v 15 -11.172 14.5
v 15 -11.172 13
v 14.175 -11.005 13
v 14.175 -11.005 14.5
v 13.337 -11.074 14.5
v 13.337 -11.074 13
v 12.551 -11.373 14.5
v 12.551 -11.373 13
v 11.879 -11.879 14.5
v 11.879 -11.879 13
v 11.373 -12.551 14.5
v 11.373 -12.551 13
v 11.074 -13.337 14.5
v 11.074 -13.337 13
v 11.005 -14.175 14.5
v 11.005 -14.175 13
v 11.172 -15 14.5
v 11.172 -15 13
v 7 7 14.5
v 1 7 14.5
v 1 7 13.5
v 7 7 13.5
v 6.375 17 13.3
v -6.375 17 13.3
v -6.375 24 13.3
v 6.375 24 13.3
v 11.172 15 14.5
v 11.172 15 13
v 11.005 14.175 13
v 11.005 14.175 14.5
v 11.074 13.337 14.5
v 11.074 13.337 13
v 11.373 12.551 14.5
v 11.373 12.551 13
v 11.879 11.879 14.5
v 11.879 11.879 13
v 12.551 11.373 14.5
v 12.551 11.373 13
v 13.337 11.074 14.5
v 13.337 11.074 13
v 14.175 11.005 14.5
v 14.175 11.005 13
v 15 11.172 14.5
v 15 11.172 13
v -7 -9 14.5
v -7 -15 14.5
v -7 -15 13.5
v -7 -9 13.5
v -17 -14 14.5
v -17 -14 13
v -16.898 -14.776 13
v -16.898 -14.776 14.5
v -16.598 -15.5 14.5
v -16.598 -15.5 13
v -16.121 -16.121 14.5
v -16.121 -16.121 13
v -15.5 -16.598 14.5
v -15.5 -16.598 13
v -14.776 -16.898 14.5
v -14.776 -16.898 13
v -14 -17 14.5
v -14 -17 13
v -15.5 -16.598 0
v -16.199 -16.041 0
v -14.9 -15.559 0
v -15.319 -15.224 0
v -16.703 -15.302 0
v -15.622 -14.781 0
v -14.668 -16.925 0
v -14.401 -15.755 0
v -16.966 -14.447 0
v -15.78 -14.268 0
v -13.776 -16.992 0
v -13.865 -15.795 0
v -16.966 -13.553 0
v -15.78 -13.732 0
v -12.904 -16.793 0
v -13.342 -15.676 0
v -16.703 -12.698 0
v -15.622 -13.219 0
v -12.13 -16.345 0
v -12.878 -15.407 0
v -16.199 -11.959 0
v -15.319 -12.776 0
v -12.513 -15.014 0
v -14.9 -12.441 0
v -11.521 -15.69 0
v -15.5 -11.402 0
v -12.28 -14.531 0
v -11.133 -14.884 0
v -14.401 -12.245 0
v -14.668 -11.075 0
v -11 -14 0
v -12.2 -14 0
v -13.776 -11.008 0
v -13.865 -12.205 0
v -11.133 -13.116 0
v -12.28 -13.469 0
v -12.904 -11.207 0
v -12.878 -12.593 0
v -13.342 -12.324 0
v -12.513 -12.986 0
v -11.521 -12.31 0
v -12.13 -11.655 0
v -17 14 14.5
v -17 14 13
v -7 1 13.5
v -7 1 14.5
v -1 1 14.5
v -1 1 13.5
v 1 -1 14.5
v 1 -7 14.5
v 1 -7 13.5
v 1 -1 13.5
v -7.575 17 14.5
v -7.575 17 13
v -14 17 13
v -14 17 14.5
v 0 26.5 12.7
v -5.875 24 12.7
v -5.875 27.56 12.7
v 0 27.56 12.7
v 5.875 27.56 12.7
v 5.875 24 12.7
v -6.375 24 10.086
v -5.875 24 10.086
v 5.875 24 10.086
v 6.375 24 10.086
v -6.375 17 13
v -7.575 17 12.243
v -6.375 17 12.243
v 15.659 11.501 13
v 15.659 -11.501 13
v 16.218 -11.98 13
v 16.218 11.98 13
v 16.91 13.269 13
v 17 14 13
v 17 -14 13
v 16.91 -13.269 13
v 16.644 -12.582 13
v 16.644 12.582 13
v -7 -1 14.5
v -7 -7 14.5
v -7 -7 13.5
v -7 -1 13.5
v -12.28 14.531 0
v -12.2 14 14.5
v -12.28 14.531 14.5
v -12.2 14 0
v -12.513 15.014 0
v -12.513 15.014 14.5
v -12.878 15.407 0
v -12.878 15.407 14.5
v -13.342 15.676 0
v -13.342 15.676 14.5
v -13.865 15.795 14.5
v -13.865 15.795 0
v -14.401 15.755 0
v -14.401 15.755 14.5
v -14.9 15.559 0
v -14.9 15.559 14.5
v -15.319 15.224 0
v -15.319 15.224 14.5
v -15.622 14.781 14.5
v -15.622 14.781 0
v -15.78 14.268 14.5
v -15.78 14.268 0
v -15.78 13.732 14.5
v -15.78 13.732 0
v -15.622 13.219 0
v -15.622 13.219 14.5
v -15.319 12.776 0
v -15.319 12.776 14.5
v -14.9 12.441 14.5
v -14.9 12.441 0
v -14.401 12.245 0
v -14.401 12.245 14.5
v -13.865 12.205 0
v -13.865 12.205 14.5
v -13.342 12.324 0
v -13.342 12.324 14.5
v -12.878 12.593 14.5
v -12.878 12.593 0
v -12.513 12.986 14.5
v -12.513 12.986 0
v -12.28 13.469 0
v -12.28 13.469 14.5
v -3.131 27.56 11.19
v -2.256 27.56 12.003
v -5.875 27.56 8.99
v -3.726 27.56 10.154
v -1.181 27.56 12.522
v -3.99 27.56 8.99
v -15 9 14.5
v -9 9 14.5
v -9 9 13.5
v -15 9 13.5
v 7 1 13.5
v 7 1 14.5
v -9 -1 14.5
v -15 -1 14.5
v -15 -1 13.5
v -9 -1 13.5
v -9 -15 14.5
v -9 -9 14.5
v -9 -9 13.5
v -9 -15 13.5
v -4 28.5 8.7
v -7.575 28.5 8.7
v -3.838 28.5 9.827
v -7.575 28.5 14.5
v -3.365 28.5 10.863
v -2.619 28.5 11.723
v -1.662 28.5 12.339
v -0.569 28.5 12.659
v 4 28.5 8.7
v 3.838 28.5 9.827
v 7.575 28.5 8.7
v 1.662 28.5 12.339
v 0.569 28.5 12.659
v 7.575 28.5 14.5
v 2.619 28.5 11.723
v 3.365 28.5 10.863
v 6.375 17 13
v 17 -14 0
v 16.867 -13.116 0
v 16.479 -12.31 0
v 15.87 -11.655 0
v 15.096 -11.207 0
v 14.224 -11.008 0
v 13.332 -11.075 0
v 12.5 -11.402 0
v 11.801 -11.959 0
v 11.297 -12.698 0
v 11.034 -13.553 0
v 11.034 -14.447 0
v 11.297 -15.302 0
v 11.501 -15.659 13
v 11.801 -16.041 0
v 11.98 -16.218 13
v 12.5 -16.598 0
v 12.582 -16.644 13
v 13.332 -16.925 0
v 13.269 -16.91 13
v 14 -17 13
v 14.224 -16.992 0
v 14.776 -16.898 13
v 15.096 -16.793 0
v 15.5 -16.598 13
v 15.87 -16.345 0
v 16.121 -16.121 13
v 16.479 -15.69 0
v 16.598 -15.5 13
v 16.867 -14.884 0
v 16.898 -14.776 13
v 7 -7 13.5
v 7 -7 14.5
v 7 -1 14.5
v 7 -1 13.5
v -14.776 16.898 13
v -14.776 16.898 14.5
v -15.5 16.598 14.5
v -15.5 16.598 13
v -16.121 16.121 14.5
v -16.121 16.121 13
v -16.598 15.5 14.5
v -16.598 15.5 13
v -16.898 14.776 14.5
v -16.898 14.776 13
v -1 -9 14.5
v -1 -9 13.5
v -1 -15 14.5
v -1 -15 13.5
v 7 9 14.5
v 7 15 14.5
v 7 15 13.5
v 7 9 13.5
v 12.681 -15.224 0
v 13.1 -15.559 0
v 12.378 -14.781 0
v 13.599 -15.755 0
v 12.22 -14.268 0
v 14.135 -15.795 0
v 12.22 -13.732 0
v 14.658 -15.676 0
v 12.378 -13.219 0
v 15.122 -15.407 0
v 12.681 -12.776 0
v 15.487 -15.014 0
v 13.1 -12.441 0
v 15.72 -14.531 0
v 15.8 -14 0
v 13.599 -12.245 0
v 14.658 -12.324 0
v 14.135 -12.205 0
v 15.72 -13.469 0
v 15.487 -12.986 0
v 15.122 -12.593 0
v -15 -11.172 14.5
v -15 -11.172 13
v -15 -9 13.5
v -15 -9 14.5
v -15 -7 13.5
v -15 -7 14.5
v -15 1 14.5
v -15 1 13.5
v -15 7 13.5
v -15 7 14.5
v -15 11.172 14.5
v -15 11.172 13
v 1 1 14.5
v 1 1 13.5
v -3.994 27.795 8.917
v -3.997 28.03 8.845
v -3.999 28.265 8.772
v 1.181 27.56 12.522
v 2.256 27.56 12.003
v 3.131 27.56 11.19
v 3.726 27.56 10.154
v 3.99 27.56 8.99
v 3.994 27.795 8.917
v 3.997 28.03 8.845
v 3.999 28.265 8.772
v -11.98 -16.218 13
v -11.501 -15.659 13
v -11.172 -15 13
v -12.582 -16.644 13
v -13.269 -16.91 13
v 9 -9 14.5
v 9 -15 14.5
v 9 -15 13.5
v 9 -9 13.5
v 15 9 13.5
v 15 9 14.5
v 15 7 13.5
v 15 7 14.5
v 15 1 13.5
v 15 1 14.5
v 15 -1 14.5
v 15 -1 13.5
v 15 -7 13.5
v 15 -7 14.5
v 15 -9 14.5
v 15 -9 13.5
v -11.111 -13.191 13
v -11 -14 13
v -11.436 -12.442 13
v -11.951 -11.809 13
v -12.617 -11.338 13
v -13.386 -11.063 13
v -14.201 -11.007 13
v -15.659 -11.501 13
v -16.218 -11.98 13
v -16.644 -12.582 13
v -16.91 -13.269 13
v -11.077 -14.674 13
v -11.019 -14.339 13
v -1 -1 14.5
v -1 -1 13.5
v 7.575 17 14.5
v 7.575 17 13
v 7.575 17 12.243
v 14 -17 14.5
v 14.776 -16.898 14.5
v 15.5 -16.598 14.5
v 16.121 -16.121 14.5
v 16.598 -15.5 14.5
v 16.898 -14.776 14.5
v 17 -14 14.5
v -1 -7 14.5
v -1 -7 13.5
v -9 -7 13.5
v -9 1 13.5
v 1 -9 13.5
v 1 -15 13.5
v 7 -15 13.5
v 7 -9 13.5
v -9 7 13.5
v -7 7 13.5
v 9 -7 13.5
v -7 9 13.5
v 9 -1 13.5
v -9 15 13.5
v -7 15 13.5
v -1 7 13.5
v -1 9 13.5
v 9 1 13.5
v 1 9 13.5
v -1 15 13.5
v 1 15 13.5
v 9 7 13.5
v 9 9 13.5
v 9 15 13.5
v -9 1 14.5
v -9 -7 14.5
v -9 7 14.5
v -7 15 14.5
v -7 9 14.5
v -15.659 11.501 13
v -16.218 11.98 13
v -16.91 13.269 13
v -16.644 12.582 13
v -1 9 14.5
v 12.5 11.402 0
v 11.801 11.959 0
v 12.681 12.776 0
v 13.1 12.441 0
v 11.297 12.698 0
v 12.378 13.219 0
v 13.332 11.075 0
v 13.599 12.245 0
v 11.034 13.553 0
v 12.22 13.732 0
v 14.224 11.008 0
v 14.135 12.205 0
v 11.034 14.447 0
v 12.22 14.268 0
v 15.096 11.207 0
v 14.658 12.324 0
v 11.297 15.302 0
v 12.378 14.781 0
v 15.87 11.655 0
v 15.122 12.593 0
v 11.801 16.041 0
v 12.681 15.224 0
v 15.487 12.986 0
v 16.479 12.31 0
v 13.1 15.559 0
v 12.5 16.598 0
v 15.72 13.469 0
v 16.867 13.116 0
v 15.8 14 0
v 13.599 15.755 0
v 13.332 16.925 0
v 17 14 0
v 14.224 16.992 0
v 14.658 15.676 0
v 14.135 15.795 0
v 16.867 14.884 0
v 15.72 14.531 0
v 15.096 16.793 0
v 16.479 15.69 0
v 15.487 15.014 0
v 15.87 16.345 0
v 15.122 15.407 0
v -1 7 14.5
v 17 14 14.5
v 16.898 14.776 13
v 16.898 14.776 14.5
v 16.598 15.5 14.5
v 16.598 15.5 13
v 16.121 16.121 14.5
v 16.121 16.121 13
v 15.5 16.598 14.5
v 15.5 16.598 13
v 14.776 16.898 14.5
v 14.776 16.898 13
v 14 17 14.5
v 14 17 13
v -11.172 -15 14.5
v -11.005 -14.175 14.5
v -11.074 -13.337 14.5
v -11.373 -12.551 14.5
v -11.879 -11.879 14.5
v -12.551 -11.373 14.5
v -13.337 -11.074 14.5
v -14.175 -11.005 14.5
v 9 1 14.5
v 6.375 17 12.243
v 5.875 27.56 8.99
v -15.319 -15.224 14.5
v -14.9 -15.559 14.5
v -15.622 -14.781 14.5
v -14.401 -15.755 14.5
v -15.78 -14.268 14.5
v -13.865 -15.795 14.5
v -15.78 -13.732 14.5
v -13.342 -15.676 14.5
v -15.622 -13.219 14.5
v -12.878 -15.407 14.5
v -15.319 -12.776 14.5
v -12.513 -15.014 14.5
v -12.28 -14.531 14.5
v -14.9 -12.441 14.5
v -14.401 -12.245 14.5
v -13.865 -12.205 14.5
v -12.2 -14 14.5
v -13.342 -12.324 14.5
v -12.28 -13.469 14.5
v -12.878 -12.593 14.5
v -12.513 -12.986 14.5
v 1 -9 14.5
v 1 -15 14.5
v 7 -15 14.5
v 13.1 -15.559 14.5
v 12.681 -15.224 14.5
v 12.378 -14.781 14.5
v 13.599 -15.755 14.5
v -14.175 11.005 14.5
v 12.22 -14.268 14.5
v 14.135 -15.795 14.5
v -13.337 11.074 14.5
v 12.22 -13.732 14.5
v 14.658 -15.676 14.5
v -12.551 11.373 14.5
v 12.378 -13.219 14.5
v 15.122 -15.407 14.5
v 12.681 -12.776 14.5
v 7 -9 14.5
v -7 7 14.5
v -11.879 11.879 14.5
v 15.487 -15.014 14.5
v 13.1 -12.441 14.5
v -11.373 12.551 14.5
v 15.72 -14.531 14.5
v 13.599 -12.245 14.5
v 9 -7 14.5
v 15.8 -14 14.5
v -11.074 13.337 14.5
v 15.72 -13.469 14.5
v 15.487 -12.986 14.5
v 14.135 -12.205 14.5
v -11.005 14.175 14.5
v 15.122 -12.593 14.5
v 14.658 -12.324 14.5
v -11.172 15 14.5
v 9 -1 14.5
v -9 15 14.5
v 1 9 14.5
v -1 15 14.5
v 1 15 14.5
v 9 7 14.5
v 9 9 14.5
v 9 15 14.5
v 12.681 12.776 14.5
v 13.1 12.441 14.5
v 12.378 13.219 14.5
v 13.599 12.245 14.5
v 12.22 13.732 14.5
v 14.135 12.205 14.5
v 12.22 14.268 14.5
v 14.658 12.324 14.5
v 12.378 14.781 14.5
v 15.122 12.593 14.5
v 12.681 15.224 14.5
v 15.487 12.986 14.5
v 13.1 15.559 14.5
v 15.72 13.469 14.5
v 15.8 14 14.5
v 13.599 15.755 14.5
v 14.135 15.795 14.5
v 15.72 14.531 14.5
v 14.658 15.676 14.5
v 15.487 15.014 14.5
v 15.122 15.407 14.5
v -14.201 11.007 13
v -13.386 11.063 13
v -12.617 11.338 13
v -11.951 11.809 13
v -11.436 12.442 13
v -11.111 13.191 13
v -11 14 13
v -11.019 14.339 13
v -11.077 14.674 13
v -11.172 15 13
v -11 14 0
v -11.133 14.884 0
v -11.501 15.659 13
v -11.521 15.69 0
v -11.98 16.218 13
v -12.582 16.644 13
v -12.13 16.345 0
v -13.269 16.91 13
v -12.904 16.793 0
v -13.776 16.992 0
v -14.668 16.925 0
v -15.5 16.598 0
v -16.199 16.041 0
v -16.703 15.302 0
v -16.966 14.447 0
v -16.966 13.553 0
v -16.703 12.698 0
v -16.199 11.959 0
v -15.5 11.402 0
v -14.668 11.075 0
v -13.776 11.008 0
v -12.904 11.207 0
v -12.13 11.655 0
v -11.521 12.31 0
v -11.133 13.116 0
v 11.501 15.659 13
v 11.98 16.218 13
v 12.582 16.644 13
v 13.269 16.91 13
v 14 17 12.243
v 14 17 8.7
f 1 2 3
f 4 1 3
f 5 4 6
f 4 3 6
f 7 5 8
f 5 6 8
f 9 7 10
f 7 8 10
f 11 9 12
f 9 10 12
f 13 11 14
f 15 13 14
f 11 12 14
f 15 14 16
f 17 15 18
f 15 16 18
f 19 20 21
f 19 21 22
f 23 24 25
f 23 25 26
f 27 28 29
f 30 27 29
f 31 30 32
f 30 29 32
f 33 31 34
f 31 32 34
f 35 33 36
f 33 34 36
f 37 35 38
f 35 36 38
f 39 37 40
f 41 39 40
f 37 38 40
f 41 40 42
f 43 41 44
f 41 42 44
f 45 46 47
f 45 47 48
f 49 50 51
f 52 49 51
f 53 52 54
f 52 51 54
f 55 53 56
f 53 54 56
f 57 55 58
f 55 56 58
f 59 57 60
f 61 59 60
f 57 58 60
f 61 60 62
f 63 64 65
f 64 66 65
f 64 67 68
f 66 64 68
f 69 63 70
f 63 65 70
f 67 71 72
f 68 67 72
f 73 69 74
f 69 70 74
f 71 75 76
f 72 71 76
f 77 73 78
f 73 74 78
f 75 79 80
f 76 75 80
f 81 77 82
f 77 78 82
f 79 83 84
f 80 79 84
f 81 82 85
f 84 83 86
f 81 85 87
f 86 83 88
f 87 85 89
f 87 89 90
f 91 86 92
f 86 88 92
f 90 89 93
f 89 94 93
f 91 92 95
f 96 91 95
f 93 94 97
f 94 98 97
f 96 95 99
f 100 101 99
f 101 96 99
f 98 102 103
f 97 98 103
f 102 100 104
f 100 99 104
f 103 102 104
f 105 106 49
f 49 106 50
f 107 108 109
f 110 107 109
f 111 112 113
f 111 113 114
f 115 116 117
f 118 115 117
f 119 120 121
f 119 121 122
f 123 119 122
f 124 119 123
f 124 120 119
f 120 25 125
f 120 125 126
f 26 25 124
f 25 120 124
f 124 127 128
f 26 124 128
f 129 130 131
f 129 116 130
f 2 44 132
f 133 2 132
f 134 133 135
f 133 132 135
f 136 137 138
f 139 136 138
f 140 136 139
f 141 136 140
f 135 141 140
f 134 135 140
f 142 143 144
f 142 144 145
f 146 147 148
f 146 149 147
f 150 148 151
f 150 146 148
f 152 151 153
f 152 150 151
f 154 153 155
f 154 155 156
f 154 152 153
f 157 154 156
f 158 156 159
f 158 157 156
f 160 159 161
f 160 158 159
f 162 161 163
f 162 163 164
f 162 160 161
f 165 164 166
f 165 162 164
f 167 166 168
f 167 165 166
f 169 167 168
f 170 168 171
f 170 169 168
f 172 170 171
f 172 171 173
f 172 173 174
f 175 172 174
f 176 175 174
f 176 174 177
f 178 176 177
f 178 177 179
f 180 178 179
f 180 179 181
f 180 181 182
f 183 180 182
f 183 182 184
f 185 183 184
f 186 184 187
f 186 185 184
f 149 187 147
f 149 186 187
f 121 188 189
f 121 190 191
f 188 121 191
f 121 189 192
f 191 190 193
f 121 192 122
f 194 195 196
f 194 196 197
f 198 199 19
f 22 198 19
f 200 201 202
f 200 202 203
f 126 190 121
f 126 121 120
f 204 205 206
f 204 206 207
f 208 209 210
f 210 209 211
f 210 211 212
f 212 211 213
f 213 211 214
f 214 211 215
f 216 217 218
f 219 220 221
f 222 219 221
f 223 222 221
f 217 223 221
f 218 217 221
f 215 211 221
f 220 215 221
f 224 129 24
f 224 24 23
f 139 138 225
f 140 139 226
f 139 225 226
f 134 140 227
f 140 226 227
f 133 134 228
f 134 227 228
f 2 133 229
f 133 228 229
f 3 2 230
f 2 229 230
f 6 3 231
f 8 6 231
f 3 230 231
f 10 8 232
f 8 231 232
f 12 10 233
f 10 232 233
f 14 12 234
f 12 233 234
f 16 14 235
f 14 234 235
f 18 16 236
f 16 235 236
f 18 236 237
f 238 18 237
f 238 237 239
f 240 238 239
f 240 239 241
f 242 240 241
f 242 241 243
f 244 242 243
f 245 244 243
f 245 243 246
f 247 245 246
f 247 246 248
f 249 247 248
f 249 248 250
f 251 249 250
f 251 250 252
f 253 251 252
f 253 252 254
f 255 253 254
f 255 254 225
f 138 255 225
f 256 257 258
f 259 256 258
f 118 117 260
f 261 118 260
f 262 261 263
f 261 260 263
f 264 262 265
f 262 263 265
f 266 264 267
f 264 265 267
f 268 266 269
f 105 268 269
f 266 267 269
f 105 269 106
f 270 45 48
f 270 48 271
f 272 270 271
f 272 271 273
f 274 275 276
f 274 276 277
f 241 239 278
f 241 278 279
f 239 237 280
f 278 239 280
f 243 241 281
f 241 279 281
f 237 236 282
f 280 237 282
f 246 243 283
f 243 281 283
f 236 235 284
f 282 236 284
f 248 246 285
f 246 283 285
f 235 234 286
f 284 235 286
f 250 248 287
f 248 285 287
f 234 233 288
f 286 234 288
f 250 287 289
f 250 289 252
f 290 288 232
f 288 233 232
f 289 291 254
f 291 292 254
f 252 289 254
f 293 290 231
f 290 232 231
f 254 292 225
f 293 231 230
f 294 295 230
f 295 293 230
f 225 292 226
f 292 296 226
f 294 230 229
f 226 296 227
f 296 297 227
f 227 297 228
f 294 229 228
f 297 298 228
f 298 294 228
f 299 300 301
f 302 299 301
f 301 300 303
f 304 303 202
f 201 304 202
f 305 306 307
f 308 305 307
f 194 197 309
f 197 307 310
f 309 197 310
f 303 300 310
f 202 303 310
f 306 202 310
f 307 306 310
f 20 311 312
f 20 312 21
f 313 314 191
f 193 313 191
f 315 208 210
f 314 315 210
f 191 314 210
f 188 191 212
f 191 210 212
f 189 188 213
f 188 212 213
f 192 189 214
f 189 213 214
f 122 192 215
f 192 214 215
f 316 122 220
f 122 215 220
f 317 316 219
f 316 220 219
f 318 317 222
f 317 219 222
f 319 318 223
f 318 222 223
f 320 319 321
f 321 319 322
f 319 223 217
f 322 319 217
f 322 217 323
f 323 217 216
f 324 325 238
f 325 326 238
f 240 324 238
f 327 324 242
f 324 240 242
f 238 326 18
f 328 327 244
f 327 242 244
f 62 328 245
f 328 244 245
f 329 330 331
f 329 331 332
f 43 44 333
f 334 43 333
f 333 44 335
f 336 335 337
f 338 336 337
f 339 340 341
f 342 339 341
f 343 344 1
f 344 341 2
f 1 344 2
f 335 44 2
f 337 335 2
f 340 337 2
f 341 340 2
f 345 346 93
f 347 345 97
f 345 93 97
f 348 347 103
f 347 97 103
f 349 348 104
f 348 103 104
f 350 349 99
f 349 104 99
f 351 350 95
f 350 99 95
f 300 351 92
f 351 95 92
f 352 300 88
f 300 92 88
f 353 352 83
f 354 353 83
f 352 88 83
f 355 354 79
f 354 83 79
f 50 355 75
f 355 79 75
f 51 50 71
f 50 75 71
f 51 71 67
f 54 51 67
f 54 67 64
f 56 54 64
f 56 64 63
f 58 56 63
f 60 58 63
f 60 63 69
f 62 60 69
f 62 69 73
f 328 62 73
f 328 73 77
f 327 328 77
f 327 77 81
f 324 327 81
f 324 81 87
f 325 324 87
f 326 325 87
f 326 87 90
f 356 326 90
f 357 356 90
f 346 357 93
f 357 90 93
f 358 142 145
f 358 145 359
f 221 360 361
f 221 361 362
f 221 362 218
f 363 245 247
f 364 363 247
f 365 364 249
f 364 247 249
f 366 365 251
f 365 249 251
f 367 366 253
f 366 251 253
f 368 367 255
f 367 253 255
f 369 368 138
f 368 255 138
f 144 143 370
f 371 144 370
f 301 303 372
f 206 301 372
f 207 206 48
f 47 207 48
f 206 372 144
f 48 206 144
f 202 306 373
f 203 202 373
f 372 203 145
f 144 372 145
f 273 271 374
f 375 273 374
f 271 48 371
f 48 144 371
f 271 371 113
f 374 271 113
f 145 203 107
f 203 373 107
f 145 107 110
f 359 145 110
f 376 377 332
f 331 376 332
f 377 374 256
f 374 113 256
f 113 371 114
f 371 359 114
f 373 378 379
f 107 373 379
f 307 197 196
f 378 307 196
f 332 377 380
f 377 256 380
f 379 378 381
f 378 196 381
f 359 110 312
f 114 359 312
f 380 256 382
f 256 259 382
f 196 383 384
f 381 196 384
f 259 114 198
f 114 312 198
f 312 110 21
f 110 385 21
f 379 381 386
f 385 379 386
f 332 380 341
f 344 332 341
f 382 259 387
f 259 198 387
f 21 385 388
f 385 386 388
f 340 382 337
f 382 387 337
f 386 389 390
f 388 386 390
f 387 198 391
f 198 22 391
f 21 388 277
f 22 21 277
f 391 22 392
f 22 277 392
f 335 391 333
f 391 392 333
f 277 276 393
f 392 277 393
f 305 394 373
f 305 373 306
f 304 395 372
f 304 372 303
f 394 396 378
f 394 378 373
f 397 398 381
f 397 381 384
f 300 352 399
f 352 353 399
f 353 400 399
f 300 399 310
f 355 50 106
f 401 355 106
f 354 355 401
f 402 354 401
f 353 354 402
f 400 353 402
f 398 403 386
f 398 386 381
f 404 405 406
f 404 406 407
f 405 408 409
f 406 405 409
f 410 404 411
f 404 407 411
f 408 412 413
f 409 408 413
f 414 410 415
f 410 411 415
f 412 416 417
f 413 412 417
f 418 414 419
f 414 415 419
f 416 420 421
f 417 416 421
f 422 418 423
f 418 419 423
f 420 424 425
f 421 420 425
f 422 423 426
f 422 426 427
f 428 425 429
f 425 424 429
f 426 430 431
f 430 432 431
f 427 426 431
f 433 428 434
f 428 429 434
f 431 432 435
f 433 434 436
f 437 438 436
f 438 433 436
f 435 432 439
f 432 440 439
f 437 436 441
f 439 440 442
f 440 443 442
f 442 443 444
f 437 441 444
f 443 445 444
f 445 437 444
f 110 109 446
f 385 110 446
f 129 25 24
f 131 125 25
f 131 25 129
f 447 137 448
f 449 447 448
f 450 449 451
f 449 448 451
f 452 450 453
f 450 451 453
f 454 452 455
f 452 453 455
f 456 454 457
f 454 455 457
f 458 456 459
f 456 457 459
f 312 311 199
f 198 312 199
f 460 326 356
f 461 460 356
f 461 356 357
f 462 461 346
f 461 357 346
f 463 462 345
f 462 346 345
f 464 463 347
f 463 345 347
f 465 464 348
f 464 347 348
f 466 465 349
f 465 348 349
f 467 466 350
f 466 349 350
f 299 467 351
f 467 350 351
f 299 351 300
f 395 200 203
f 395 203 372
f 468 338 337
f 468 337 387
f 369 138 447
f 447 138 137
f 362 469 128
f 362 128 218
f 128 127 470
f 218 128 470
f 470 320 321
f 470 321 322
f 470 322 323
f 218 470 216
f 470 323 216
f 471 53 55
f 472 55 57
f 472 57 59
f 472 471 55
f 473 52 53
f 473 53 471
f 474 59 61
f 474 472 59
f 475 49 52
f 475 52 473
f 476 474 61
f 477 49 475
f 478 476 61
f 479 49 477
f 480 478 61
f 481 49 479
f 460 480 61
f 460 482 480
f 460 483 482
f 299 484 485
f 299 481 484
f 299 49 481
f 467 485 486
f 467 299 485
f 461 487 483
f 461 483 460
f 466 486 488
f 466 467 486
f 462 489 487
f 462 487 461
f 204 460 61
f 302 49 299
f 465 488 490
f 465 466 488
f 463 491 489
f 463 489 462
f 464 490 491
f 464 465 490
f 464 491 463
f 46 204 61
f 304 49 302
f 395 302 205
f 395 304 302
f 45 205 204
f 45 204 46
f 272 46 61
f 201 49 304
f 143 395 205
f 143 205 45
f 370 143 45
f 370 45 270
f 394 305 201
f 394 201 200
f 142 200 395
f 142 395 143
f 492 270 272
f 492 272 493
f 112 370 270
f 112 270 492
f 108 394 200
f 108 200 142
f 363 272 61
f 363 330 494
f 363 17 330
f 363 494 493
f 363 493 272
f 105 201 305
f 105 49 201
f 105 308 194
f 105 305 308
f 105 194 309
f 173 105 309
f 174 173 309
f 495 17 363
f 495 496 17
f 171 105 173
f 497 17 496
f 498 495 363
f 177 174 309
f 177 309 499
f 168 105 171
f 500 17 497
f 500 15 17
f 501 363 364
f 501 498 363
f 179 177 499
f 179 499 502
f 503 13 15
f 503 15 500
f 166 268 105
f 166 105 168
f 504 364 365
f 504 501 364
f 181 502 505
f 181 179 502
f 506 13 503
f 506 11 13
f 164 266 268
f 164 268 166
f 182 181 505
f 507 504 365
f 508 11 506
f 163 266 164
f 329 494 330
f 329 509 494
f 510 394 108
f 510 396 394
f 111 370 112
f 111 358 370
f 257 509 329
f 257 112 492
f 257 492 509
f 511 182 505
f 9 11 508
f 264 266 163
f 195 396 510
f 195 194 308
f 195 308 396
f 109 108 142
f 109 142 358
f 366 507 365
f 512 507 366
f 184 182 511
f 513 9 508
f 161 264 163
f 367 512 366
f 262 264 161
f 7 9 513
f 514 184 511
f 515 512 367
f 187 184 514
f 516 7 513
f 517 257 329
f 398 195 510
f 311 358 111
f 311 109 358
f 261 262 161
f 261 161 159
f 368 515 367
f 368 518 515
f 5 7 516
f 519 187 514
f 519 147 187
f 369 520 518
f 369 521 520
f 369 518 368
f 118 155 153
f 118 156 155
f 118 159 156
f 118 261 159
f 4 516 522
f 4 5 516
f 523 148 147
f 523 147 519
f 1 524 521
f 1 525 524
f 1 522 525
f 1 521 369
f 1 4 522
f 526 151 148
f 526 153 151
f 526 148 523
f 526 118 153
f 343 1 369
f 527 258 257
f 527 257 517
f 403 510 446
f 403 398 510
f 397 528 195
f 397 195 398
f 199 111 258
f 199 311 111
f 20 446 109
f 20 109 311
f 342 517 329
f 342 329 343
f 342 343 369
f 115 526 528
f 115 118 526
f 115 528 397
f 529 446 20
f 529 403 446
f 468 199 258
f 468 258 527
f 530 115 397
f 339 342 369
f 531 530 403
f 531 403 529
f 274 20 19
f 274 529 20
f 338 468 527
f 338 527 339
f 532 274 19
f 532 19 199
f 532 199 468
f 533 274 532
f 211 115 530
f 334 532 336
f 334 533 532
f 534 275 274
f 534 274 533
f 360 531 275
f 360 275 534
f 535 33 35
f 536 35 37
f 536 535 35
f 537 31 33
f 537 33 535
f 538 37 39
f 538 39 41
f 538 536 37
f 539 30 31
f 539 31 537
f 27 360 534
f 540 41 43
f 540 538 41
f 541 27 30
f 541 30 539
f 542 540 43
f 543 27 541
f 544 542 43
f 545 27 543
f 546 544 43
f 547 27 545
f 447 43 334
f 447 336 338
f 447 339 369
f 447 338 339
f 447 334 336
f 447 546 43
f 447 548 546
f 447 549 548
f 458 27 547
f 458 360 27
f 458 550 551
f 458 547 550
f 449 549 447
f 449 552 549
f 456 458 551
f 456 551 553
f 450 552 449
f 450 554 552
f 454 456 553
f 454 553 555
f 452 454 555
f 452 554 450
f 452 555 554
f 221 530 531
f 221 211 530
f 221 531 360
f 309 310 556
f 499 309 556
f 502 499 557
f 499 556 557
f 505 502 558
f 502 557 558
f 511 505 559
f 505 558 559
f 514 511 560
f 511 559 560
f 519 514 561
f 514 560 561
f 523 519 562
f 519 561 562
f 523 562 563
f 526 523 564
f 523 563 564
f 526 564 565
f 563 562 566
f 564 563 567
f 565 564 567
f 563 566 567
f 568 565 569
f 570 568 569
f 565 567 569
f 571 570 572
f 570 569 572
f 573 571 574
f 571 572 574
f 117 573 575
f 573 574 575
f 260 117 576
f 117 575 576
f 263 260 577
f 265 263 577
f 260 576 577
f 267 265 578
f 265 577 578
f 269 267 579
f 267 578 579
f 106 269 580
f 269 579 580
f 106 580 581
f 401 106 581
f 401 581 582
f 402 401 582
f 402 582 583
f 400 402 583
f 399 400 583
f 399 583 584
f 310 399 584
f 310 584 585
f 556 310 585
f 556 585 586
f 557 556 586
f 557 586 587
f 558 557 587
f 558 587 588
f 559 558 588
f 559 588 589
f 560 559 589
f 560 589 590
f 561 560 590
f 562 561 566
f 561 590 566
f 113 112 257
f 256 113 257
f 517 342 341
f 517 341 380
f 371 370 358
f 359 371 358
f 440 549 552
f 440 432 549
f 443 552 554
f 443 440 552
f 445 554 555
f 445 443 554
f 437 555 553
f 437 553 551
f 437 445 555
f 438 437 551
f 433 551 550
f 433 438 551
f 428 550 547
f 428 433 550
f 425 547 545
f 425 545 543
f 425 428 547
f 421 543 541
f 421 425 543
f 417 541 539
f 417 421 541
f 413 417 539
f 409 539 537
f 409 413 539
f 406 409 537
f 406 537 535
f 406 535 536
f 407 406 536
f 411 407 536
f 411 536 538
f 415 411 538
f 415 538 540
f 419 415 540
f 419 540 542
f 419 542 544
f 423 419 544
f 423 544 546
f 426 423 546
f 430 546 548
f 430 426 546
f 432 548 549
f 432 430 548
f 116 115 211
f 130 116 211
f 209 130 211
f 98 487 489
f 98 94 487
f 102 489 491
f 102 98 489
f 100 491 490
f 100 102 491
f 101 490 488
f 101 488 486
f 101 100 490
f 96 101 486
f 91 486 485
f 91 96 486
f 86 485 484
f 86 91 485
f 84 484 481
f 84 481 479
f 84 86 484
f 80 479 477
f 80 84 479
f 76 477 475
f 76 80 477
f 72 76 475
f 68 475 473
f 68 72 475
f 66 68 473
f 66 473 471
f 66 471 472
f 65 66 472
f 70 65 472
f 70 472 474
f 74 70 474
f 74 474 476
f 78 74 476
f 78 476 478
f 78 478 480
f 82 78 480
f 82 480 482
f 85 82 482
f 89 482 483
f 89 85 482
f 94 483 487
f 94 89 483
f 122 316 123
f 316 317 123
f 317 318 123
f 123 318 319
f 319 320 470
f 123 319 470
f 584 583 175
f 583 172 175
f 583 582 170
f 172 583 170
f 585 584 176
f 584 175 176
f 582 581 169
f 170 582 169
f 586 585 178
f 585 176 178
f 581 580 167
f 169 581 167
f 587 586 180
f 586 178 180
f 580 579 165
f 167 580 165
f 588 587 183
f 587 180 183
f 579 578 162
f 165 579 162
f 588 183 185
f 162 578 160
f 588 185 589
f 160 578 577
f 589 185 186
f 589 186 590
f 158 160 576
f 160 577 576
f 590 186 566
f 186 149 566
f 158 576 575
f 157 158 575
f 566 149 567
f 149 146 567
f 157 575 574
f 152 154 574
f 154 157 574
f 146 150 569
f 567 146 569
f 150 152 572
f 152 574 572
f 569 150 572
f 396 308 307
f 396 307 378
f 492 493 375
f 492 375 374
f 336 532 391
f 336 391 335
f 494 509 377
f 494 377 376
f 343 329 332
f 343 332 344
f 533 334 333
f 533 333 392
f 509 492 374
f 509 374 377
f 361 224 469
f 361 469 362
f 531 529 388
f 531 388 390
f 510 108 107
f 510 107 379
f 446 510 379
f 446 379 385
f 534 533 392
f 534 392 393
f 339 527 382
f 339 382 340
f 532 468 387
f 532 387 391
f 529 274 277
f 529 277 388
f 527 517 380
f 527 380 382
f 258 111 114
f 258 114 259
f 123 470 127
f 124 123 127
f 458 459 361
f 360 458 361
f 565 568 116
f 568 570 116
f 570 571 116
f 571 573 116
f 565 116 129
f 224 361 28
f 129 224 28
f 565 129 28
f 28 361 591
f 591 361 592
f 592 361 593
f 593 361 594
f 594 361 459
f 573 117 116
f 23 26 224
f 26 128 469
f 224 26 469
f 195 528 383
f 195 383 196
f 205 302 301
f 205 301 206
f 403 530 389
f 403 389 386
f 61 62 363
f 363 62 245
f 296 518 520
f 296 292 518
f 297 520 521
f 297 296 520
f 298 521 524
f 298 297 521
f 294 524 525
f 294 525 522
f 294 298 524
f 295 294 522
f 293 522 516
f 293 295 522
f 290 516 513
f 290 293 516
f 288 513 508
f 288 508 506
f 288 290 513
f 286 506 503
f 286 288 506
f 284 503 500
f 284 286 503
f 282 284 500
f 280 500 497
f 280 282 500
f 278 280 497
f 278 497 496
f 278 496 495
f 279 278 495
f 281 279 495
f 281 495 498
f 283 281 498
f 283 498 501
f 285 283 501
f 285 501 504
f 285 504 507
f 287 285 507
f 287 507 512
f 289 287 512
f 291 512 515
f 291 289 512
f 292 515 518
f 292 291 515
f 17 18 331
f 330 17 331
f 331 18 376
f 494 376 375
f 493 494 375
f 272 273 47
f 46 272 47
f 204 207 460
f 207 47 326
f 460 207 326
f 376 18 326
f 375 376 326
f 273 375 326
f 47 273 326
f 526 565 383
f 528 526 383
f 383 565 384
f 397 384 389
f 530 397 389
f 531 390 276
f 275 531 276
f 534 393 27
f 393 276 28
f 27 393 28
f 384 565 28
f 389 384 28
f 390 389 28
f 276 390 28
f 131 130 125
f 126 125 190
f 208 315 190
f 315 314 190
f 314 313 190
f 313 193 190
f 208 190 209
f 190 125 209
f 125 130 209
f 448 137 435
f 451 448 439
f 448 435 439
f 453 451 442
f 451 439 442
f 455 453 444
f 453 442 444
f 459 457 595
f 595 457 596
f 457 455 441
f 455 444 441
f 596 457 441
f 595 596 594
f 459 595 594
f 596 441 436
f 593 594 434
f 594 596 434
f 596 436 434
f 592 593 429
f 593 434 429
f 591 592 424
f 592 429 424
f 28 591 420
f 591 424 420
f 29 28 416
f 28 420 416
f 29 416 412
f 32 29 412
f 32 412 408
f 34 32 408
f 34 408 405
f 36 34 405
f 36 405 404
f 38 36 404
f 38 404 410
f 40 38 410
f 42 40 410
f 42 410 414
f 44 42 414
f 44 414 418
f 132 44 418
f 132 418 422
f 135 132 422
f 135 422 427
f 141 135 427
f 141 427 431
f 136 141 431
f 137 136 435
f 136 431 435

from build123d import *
from build123d import SkipClean  # not in build123d's __all__

# Parameters (mm, degrees)
F0_R      = 3
F0_R_2    = 1.8
F1_DEPTH  = 13
F2_R      = 1.8
F3_DEPTH  = 1.5
F4_W      = 6
F4_H      = 6
F5_DEPTH  = 1
F6_W      = 15.15
F6_H      = 11.5
F7_DEPTH  = 5.8
F8_W      = 12.75
F8_H      = 7
F9_DEPTH  = 4.6
F10_W     = 11.75
F10_H     = 3.56
F11_DEPTH = 4
F13_DEPTH = 2
F15_DEPTH = 25


with BuildPart() as f1:
    # F0 (on Top) → F1 (new body)
    with BuildSketch(Plane.XY):
        with Locations((-14, 14)):
            Circle(F0_R)
        with Locations((-14, 14)):
            Circle(F0_R_2, mode=Mode.SUBTRACT)
    extrude(amount=F1_DEPTH)



with BuildPart() as f1b:
    # F0 (on Top) → F1, piece 2 (new body)
    with BuildSketch(Plane.XY):
        with Locations((-14, -14)):
            Circle(F0_R)
        with Locations((-14, -14)):
            Circle(F0_R_2, mode=Mode.SUBTRACT)
    extrude(amount=F1_DEPTH)


with BuildPart() as f1c:
    # F0 (on Top) → F1, piece 3 (new body)
    with BuildSketch(Plane.XY):
        with Locations((14, -14)):
            Circle(F0_R)
        with Locations((14, -14)):
            Circle(F0_R_2, mode=Mode.SUBTRACT)
    extrude(amount=F1_DEPTH)


with BuildPart() as f1d:
    # F0 (on Top) → F1, piece 4 (new body)
    with BuildSketch(Plane.XY):
        with Locations((14, 14)):
            Circle(F0_R)
        with Locations((14, 14)):
            Circle(F0_R_2, mode=Mode.SUBTRACT)
    extrude(amount=F1_DEPTH)


with BuildPart() as f1_1:
    add(f1.part, clean=False)

    with SkipClean():  # cleaning this boolean's faces spoils the solid; the shape is the same uncleaned
        add(f1b.part)  # F3 merges F1b

    with SkipClean():  # cleaning this boolean's faces spoils the solid; the shape is the same uncleaned
        add(f1c.part)  # F3 merges F1c

    with SkipClean():  # cleaning this boolean's faces spoils the solid; the shape is the same uncleaned
        add(f1d.part)  # F3 merges F1d
    # F2 (on face) → F3 (join)
    with BuildSketch(Plane.XY.offset(13)):
        with BuildLine():
            Line((14, 17), (-14, 17))
            ThreePointArc((-14, 17), (-16.1213203436, 16.1213203436), (-17, 14))
            Line((-17, 14), (-17, -14))
            ThreePointArc((-17, -14), (-16.1213203436, -16.1213203436), (-14, -17))
            Line((-14, -17), (14, -17))
            ThreePointArc((14, -17), (16.1213203436, -16.1213203436), (17, -14))
            Line((17, -14), (17, 14))
            ThreePointArc((17, 14), (16.1213203436, 16.1213203436), (14, 17))
        make_face()
        with Locations((-14, -14)):
            Circle(F2_R, mode=Mode.SUBTRACT)
        with Locations((14, -14)):
            Circle(F2_R, mode=Mode.SUBTRACT)
        with Locations((-14, 14)):
            Circle(F2_R, mode=Mode.SUBTRACT)
        with BuildLine():
            Line((-15, -11.1715728753), (-15, 11.1715728753))
            ThreePointArc((-15, 11.1715728753), (-11.8786796564, 11.8786796564), (-11.1715728753, 15))
            Line((-11.1715728753, 15), (11.1715728753, 15))
            ThreePointArc((11.1715728753, 15), (11.8786796564, 11.8786796564), (15, 11.1715728753))
            Line((15, 11.1715728753), (15, -11.1715728753))
            ThreePointArc((15, -11.1715728753), (11.8786796564, -11.8786796564), (11.1715728753, -15))
            Line((11.1715728753, -15), (-11.1715728753, -15))
            ThreePointArc((-11.1715728753, -15), (-11.8786796564, -11.8786796564), (-15, -11.1715728753))
        make_face(mode=Mode.SUBTRACT)
        with Locations((14, 14)):
            Circle(F2_R, mode=Mode.SUBTRACT)
    with SkipClean():  # cleaning this boolean's faces spoils the solid; the shape is the same uncleaned
        extrude(amount=F3_DEPTH)

    # F4 (on face) → F5 (join)
    with BuildSketch(Plane.XY.offset(14.5)):
        Polygon((1, 15), (-1, 15), (-1, 9), (-7, 9), (-7, 15), (-9, 15), (-9, 9), (-15, 9), (-15, 7), (-9, 7), (-9, 1), (-15, 1), (-15, -1), (-9, -1), (-9, -7), (-15, -7), (-15, -9), (-9, -9), (-9, -15), (-7, -15), (-7, -9), (-1, -9), (-1, -15), (1, -15), (1, -9), (7, -9), (7, -15), (9, -15), (9, -9), (15, -9), (15, -7), (9, -7), (9, -1), (15, -1), (15, 1), (9, 1), (9, 7), (15, 7), (15, 9), (9, 9), (9, 15), (7, 15), (7, 9), (1, 9), align=None)
        with Locations((-4, -4)):
            Rectangle(F4_W, F4_H, mode=Mode.SUBTRACT)
        with Locations((4, -4)):
            Rectangle(F4_W, F4_H, mode=Mode.SUBTRACT)
        with Locations((-4, 4)):
            Rectangle(F4_W, F4_H, mode=Mode.SUBTRACT)
        with Locations((4, 4)):
            Rectangle(F4_W, F4_H, mode=Mode.SUBTRACT)
    extrude(amount=-F5_DEPTH)

    # F6 (on face) → F7 (join)
    with BuildSketch(Plane.XY.offset(14.5)):
        with Locations((0, 22.75)):
            Rectangle(F6_W, F6_H)
    with SkipClean():  # cleaning this boolean's faces spoils the solid; the shape is the same uncleaned
        extrude(amount=-F7_DEPTH)

    # F8 (on face) → F9 (cut)
    with BuildSketch(Plane(origin=(0, 0, 8.7), x_dir=(1, 0, 0), z_dir=(0, 0, -1))):
        with Locations((0, -20.5)):
            Rectangle(F8_W, F8_H)
    with SkipClean():  # cleaning this boolean's faces spoils the solid; the shape is the same uncleaned
        extrude(amount=-F9_DEPTH, mode=Mode.SUBTRACT)

    # F10 (on face) → F11 (cut)
    with BuildSketch(Plane(origin=(0, 0, 8.7), x_dir=(1, 0, 0), z_dir=(0, 0, -1))):
        with Locations((0, -25.78)):
            Rectangle(F10_W, F10_H)
    with SkipClean():  # cleaning this boolean's faces spoils the solid; the shape is the same uncleaned
        extrude(amount=-F11_DEPTH, mode=Mode.SUBTRACT)

    # F12 (on face) → F13 (cut, symmetric)
    with BuildSketch(Plane(origin=(0, 28.5, 0), x_dir=(-1, 0, 0), z_dir=(0, 1, 0))):
        with BuildLine():
            Line((-4, 8.7), (4, 8.7))
            ThreePointArc((4, 8.7), (0, 12.7), (-4, 8.7))
        make_face()
    with SkipClean():  # cleaning this boolean's faces spoils the solid; the shape is the same uncleaned
        extrude(amount=F13_DEPTH, both=True, mode=Mode.SUBTRACT)

    # F14 (on face) → F15 (cut)
    with BuildSketch(Plane(origin=(-7.575, 0, 0), x_dir=(0, -1, 0), z_dir=(-1, 0, 0))):
        Polygon((-17, 12.2429373081), (-28.5, 8.7), (-17, 8.7), align=None)
    extrude(amount=-F15_DEPTH, mode=Mode.SUBTRACT)


solid = f1_1.part
